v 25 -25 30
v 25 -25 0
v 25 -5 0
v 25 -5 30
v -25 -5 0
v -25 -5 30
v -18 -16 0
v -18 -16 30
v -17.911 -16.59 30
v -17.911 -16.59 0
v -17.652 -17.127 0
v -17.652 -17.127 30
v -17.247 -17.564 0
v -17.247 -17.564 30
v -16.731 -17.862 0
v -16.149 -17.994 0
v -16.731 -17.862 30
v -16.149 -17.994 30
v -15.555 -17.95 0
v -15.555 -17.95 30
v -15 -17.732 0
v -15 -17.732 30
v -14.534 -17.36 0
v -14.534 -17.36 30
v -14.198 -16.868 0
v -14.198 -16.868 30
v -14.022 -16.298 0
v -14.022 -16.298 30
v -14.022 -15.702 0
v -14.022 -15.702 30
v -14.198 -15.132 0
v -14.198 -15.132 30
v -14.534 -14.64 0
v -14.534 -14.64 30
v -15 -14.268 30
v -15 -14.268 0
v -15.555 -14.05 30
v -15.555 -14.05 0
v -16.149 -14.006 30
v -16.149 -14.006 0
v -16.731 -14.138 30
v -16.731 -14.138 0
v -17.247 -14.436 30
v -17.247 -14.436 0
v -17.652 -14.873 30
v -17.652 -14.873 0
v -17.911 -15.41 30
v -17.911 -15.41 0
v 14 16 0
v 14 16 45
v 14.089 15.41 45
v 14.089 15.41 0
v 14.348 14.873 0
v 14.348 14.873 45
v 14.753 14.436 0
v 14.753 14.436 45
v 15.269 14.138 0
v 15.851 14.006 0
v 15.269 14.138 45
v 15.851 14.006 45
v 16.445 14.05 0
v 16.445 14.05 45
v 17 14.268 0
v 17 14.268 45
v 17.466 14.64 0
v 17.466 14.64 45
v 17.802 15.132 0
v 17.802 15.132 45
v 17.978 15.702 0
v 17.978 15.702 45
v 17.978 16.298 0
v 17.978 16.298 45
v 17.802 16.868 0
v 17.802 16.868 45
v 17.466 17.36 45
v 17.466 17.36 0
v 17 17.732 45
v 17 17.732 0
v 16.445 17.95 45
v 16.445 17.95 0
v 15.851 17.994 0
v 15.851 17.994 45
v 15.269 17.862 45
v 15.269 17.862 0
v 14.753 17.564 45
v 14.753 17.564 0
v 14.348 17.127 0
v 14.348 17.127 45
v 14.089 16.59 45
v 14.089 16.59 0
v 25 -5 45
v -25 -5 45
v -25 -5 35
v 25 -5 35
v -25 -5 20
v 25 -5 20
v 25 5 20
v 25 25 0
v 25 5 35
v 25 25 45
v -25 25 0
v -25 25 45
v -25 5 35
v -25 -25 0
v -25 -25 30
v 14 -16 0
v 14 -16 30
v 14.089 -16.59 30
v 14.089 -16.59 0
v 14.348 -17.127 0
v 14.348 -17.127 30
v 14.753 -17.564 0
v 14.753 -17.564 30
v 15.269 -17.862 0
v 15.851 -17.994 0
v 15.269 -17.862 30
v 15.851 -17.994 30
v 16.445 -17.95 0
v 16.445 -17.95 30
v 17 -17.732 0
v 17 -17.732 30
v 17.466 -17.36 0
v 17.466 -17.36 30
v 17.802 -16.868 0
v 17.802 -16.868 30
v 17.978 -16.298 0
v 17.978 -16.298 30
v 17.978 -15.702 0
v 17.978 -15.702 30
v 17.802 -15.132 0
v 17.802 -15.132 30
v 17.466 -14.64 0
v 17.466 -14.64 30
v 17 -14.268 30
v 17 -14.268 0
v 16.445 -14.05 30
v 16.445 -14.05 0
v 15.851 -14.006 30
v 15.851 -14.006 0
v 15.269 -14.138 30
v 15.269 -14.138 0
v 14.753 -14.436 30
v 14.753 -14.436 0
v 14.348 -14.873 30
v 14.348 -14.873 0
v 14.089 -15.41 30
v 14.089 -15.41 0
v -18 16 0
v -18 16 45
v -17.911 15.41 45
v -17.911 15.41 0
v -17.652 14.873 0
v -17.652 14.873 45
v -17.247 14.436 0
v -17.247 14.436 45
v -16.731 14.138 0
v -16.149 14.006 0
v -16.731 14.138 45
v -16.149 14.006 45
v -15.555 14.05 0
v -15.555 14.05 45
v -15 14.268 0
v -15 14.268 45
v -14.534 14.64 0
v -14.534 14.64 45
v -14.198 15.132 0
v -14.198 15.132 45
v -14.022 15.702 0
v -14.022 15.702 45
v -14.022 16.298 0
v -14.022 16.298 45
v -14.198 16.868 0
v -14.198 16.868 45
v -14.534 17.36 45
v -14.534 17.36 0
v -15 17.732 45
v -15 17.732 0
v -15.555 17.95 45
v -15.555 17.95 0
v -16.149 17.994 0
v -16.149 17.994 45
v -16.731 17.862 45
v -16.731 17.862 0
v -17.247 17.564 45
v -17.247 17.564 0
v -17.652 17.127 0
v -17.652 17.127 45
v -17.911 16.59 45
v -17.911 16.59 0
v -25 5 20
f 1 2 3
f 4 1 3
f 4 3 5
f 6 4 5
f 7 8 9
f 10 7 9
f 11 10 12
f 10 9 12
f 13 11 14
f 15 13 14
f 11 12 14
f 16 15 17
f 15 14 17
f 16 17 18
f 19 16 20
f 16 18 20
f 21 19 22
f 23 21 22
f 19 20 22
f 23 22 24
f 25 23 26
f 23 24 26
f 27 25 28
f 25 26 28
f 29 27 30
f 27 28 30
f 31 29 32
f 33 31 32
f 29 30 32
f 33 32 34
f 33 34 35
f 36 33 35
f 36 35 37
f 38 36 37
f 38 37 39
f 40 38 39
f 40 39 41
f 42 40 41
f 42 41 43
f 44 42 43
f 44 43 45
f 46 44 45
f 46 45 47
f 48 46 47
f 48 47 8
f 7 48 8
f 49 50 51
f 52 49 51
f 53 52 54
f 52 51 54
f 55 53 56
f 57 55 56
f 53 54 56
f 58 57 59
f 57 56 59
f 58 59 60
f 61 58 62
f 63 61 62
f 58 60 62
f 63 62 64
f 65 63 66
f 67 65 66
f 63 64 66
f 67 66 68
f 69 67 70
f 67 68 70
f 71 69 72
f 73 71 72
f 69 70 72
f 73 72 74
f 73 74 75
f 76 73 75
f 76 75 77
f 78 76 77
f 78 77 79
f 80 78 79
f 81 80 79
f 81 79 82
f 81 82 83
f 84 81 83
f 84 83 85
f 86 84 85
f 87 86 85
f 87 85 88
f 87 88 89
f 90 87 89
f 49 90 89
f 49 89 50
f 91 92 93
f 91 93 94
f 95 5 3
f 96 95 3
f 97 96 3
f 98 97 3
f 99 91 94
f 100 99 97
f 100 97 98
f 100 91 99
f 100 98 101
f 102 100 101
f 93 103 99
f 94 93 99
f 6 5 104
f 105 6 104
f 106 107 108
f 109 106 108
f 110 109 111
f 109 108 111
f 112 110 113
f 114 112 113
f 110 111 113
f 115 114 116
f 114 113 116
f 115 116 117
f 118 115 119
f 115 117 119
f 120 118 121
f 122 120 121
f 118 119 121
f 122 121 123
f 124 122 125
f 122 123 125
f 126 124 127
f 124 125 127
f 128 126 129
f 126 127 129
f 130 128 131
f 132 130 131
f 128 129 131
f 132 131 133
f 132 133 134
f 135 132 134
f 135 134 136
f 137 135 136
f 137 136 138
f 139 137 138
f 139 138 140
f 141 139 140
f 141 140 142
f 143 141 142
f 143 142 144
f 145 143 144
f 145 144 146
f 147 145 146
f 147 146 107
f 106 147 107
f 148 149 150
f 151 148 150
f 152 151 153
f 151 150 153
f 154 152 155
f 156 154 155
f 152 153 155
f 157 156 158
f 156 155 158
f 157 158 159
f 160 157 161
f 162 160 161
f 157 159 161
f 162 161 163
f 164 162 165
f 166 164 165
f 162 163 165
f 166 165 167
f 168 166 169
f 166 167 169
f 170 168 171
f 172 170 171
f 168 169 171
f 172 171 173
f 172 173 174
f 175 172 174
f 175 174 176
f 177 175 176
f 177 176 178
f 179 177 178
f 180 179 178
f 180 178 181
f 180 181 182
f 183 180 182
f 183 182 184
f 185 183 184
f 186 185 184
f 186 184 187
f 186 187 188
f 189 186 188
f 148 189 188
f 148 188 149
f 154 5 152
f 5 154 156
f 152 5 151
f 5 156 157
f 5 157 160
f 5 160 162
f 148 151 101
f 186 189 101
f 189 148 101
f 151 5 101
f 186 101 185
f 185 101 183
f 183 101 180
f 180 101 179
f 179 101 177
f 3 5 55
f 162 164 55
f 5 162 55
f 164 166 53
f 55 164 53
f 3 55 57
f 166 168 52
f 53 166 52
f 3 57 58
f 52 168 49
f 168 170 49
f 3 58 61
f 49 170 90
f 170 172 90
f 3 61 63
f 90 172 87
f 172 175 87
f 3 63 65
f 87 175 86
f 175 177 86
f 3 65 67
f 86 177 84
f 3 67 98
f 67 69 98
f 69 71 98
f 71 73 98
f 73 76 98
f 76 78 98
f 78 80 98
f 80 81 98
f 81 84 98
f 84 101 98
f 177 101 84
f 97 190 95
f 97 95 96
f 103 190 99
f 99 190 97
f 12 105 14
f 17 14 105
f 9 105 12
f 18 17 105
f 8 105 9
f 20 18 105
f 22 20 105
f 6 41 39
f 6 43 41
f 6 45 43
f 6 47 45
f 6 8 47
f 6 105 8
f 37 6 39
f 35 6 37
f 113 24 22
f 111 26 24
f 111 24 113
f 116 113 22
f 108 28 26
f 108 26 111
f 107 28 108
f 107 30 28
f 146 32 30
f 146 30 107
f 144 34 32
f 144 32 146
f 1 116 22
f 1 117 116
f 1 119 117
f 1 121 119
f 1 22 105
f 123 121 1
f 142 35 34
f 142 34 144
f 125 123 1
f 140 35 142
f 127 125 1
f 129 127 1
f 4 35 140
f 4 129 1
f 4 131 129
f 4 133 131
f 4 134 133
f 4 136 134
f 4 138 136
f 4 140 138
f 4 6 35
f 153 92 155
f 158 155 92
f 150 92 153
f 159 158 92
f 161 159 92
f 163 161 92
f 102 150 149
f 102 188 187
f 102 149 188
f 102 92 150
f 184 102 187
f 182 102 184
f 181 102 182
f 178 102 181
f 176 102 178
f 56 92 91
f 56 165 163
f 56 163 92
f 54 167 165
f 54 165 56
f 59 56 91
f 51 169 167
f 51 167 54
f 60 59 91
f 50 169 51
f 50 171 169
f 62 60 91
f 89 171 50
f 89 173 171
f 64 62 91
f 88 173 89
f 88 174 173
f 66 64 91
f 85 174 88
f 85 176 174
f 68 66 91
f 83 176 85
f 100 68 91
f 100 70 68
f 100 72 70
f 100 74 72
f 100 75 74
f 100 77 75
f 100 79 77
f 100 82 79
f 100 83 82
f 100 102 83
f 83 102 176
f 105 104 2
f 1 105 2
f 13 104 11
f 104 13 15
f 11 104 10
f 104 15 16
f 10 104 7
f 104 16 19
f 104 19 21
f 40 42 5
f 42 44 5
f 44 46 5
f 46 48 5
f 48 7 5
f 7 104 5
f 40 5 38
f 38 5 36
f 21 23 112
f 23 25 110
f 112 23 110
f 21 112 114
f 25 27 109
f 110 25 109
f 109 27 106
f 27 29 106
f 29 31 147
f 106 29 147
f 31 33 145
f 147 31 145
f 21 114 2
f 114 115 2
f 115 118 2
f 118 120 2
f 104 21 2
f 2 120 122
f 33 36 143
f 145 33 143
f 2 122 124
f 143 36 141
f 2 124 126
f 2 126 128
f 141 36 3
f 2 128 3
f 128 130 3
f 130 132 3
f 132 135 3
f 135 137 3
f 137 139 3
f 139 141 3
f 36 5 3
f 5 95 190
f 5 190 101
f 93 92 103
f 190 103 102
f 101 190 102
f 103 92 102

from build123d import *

# Parameters (mm, degrees)
F0_W     = 32
F0_H     = 11
F1_DEPTH = 30
F0_W_2   = 9
F0_H_2   = 10
F2_DEPTH = 20
F3_D     = 4
F4_DEPTH = 45
F5_W     = 50
F5_H     = 10
F6_DEPTH = 10
F7_D     = 4


with BuildPart() as f1:
    # F0 (on Top) → F1 (new body)
    with BuildSketch(Plane.XY):
        Polygon((25, -25), (25, -5), (16, -5), (16, -16), (-16, -16), (-16, -5), (-25, -5), (-25, -25), align=None)
        with Locations((0, -10.5)):
            Rectangle(F0_W, F0_H)
    extrude(amount=F1_DEPTH)

    # F3 (through all)
    with Locations(Plane(origin=(0, 0, 0), x_dir=(1, 0, 0), z_dir=(0, 0, -1))):
        with Locations((-16, -16), (-16, 16), (16, -16), (16, 16)):
            Hole(F3_D / 2)


with BuildPart() as f2:
    # F0 (on Top) → F2 (new body)
    with BuildSketch(Plane.XY):
        with Locations((20.5, 0)):
            Rectangle(F0_W_2, F0_H_2)
        Rectangle(F0_W, F0_H_2)
        with Locations((-20.5, 0)):
            Rectangle(F0_W_2, F0_H_2)
    extrude(amount=F2_DEPTH)

    # F0 (on Top) → F4 (join)
    with BuildSketch(Plane.XY):
        Polygon((25, 5), (25, 25), (-25, 25), (-25, 5), (-16, 5), (-16, 16), (16, 16), (16, 5), align=None)
        with Locations((0, 10.5)):
            Rectangle(F0_W, F0_H)
    extrude(amount=F4_DEPTH)

    # F5 (on face) → F6 (join)
    with BuildSketch(Plane.XY.offset(45)):
        Rectangle(F5_W, F5_H)
    extrude(amount=-F6_DEPTH)

    # F7 (through all)
    with Locations(Plane(origin=(0, 0, 0), x_dir=(1, 0, 0), z_dir=(0, 0, -1))):
        with Locations((-16, -16), (16, -16)):
            Hole(F7_D / 2)


solid = Compound([f1.part, f2.part])
